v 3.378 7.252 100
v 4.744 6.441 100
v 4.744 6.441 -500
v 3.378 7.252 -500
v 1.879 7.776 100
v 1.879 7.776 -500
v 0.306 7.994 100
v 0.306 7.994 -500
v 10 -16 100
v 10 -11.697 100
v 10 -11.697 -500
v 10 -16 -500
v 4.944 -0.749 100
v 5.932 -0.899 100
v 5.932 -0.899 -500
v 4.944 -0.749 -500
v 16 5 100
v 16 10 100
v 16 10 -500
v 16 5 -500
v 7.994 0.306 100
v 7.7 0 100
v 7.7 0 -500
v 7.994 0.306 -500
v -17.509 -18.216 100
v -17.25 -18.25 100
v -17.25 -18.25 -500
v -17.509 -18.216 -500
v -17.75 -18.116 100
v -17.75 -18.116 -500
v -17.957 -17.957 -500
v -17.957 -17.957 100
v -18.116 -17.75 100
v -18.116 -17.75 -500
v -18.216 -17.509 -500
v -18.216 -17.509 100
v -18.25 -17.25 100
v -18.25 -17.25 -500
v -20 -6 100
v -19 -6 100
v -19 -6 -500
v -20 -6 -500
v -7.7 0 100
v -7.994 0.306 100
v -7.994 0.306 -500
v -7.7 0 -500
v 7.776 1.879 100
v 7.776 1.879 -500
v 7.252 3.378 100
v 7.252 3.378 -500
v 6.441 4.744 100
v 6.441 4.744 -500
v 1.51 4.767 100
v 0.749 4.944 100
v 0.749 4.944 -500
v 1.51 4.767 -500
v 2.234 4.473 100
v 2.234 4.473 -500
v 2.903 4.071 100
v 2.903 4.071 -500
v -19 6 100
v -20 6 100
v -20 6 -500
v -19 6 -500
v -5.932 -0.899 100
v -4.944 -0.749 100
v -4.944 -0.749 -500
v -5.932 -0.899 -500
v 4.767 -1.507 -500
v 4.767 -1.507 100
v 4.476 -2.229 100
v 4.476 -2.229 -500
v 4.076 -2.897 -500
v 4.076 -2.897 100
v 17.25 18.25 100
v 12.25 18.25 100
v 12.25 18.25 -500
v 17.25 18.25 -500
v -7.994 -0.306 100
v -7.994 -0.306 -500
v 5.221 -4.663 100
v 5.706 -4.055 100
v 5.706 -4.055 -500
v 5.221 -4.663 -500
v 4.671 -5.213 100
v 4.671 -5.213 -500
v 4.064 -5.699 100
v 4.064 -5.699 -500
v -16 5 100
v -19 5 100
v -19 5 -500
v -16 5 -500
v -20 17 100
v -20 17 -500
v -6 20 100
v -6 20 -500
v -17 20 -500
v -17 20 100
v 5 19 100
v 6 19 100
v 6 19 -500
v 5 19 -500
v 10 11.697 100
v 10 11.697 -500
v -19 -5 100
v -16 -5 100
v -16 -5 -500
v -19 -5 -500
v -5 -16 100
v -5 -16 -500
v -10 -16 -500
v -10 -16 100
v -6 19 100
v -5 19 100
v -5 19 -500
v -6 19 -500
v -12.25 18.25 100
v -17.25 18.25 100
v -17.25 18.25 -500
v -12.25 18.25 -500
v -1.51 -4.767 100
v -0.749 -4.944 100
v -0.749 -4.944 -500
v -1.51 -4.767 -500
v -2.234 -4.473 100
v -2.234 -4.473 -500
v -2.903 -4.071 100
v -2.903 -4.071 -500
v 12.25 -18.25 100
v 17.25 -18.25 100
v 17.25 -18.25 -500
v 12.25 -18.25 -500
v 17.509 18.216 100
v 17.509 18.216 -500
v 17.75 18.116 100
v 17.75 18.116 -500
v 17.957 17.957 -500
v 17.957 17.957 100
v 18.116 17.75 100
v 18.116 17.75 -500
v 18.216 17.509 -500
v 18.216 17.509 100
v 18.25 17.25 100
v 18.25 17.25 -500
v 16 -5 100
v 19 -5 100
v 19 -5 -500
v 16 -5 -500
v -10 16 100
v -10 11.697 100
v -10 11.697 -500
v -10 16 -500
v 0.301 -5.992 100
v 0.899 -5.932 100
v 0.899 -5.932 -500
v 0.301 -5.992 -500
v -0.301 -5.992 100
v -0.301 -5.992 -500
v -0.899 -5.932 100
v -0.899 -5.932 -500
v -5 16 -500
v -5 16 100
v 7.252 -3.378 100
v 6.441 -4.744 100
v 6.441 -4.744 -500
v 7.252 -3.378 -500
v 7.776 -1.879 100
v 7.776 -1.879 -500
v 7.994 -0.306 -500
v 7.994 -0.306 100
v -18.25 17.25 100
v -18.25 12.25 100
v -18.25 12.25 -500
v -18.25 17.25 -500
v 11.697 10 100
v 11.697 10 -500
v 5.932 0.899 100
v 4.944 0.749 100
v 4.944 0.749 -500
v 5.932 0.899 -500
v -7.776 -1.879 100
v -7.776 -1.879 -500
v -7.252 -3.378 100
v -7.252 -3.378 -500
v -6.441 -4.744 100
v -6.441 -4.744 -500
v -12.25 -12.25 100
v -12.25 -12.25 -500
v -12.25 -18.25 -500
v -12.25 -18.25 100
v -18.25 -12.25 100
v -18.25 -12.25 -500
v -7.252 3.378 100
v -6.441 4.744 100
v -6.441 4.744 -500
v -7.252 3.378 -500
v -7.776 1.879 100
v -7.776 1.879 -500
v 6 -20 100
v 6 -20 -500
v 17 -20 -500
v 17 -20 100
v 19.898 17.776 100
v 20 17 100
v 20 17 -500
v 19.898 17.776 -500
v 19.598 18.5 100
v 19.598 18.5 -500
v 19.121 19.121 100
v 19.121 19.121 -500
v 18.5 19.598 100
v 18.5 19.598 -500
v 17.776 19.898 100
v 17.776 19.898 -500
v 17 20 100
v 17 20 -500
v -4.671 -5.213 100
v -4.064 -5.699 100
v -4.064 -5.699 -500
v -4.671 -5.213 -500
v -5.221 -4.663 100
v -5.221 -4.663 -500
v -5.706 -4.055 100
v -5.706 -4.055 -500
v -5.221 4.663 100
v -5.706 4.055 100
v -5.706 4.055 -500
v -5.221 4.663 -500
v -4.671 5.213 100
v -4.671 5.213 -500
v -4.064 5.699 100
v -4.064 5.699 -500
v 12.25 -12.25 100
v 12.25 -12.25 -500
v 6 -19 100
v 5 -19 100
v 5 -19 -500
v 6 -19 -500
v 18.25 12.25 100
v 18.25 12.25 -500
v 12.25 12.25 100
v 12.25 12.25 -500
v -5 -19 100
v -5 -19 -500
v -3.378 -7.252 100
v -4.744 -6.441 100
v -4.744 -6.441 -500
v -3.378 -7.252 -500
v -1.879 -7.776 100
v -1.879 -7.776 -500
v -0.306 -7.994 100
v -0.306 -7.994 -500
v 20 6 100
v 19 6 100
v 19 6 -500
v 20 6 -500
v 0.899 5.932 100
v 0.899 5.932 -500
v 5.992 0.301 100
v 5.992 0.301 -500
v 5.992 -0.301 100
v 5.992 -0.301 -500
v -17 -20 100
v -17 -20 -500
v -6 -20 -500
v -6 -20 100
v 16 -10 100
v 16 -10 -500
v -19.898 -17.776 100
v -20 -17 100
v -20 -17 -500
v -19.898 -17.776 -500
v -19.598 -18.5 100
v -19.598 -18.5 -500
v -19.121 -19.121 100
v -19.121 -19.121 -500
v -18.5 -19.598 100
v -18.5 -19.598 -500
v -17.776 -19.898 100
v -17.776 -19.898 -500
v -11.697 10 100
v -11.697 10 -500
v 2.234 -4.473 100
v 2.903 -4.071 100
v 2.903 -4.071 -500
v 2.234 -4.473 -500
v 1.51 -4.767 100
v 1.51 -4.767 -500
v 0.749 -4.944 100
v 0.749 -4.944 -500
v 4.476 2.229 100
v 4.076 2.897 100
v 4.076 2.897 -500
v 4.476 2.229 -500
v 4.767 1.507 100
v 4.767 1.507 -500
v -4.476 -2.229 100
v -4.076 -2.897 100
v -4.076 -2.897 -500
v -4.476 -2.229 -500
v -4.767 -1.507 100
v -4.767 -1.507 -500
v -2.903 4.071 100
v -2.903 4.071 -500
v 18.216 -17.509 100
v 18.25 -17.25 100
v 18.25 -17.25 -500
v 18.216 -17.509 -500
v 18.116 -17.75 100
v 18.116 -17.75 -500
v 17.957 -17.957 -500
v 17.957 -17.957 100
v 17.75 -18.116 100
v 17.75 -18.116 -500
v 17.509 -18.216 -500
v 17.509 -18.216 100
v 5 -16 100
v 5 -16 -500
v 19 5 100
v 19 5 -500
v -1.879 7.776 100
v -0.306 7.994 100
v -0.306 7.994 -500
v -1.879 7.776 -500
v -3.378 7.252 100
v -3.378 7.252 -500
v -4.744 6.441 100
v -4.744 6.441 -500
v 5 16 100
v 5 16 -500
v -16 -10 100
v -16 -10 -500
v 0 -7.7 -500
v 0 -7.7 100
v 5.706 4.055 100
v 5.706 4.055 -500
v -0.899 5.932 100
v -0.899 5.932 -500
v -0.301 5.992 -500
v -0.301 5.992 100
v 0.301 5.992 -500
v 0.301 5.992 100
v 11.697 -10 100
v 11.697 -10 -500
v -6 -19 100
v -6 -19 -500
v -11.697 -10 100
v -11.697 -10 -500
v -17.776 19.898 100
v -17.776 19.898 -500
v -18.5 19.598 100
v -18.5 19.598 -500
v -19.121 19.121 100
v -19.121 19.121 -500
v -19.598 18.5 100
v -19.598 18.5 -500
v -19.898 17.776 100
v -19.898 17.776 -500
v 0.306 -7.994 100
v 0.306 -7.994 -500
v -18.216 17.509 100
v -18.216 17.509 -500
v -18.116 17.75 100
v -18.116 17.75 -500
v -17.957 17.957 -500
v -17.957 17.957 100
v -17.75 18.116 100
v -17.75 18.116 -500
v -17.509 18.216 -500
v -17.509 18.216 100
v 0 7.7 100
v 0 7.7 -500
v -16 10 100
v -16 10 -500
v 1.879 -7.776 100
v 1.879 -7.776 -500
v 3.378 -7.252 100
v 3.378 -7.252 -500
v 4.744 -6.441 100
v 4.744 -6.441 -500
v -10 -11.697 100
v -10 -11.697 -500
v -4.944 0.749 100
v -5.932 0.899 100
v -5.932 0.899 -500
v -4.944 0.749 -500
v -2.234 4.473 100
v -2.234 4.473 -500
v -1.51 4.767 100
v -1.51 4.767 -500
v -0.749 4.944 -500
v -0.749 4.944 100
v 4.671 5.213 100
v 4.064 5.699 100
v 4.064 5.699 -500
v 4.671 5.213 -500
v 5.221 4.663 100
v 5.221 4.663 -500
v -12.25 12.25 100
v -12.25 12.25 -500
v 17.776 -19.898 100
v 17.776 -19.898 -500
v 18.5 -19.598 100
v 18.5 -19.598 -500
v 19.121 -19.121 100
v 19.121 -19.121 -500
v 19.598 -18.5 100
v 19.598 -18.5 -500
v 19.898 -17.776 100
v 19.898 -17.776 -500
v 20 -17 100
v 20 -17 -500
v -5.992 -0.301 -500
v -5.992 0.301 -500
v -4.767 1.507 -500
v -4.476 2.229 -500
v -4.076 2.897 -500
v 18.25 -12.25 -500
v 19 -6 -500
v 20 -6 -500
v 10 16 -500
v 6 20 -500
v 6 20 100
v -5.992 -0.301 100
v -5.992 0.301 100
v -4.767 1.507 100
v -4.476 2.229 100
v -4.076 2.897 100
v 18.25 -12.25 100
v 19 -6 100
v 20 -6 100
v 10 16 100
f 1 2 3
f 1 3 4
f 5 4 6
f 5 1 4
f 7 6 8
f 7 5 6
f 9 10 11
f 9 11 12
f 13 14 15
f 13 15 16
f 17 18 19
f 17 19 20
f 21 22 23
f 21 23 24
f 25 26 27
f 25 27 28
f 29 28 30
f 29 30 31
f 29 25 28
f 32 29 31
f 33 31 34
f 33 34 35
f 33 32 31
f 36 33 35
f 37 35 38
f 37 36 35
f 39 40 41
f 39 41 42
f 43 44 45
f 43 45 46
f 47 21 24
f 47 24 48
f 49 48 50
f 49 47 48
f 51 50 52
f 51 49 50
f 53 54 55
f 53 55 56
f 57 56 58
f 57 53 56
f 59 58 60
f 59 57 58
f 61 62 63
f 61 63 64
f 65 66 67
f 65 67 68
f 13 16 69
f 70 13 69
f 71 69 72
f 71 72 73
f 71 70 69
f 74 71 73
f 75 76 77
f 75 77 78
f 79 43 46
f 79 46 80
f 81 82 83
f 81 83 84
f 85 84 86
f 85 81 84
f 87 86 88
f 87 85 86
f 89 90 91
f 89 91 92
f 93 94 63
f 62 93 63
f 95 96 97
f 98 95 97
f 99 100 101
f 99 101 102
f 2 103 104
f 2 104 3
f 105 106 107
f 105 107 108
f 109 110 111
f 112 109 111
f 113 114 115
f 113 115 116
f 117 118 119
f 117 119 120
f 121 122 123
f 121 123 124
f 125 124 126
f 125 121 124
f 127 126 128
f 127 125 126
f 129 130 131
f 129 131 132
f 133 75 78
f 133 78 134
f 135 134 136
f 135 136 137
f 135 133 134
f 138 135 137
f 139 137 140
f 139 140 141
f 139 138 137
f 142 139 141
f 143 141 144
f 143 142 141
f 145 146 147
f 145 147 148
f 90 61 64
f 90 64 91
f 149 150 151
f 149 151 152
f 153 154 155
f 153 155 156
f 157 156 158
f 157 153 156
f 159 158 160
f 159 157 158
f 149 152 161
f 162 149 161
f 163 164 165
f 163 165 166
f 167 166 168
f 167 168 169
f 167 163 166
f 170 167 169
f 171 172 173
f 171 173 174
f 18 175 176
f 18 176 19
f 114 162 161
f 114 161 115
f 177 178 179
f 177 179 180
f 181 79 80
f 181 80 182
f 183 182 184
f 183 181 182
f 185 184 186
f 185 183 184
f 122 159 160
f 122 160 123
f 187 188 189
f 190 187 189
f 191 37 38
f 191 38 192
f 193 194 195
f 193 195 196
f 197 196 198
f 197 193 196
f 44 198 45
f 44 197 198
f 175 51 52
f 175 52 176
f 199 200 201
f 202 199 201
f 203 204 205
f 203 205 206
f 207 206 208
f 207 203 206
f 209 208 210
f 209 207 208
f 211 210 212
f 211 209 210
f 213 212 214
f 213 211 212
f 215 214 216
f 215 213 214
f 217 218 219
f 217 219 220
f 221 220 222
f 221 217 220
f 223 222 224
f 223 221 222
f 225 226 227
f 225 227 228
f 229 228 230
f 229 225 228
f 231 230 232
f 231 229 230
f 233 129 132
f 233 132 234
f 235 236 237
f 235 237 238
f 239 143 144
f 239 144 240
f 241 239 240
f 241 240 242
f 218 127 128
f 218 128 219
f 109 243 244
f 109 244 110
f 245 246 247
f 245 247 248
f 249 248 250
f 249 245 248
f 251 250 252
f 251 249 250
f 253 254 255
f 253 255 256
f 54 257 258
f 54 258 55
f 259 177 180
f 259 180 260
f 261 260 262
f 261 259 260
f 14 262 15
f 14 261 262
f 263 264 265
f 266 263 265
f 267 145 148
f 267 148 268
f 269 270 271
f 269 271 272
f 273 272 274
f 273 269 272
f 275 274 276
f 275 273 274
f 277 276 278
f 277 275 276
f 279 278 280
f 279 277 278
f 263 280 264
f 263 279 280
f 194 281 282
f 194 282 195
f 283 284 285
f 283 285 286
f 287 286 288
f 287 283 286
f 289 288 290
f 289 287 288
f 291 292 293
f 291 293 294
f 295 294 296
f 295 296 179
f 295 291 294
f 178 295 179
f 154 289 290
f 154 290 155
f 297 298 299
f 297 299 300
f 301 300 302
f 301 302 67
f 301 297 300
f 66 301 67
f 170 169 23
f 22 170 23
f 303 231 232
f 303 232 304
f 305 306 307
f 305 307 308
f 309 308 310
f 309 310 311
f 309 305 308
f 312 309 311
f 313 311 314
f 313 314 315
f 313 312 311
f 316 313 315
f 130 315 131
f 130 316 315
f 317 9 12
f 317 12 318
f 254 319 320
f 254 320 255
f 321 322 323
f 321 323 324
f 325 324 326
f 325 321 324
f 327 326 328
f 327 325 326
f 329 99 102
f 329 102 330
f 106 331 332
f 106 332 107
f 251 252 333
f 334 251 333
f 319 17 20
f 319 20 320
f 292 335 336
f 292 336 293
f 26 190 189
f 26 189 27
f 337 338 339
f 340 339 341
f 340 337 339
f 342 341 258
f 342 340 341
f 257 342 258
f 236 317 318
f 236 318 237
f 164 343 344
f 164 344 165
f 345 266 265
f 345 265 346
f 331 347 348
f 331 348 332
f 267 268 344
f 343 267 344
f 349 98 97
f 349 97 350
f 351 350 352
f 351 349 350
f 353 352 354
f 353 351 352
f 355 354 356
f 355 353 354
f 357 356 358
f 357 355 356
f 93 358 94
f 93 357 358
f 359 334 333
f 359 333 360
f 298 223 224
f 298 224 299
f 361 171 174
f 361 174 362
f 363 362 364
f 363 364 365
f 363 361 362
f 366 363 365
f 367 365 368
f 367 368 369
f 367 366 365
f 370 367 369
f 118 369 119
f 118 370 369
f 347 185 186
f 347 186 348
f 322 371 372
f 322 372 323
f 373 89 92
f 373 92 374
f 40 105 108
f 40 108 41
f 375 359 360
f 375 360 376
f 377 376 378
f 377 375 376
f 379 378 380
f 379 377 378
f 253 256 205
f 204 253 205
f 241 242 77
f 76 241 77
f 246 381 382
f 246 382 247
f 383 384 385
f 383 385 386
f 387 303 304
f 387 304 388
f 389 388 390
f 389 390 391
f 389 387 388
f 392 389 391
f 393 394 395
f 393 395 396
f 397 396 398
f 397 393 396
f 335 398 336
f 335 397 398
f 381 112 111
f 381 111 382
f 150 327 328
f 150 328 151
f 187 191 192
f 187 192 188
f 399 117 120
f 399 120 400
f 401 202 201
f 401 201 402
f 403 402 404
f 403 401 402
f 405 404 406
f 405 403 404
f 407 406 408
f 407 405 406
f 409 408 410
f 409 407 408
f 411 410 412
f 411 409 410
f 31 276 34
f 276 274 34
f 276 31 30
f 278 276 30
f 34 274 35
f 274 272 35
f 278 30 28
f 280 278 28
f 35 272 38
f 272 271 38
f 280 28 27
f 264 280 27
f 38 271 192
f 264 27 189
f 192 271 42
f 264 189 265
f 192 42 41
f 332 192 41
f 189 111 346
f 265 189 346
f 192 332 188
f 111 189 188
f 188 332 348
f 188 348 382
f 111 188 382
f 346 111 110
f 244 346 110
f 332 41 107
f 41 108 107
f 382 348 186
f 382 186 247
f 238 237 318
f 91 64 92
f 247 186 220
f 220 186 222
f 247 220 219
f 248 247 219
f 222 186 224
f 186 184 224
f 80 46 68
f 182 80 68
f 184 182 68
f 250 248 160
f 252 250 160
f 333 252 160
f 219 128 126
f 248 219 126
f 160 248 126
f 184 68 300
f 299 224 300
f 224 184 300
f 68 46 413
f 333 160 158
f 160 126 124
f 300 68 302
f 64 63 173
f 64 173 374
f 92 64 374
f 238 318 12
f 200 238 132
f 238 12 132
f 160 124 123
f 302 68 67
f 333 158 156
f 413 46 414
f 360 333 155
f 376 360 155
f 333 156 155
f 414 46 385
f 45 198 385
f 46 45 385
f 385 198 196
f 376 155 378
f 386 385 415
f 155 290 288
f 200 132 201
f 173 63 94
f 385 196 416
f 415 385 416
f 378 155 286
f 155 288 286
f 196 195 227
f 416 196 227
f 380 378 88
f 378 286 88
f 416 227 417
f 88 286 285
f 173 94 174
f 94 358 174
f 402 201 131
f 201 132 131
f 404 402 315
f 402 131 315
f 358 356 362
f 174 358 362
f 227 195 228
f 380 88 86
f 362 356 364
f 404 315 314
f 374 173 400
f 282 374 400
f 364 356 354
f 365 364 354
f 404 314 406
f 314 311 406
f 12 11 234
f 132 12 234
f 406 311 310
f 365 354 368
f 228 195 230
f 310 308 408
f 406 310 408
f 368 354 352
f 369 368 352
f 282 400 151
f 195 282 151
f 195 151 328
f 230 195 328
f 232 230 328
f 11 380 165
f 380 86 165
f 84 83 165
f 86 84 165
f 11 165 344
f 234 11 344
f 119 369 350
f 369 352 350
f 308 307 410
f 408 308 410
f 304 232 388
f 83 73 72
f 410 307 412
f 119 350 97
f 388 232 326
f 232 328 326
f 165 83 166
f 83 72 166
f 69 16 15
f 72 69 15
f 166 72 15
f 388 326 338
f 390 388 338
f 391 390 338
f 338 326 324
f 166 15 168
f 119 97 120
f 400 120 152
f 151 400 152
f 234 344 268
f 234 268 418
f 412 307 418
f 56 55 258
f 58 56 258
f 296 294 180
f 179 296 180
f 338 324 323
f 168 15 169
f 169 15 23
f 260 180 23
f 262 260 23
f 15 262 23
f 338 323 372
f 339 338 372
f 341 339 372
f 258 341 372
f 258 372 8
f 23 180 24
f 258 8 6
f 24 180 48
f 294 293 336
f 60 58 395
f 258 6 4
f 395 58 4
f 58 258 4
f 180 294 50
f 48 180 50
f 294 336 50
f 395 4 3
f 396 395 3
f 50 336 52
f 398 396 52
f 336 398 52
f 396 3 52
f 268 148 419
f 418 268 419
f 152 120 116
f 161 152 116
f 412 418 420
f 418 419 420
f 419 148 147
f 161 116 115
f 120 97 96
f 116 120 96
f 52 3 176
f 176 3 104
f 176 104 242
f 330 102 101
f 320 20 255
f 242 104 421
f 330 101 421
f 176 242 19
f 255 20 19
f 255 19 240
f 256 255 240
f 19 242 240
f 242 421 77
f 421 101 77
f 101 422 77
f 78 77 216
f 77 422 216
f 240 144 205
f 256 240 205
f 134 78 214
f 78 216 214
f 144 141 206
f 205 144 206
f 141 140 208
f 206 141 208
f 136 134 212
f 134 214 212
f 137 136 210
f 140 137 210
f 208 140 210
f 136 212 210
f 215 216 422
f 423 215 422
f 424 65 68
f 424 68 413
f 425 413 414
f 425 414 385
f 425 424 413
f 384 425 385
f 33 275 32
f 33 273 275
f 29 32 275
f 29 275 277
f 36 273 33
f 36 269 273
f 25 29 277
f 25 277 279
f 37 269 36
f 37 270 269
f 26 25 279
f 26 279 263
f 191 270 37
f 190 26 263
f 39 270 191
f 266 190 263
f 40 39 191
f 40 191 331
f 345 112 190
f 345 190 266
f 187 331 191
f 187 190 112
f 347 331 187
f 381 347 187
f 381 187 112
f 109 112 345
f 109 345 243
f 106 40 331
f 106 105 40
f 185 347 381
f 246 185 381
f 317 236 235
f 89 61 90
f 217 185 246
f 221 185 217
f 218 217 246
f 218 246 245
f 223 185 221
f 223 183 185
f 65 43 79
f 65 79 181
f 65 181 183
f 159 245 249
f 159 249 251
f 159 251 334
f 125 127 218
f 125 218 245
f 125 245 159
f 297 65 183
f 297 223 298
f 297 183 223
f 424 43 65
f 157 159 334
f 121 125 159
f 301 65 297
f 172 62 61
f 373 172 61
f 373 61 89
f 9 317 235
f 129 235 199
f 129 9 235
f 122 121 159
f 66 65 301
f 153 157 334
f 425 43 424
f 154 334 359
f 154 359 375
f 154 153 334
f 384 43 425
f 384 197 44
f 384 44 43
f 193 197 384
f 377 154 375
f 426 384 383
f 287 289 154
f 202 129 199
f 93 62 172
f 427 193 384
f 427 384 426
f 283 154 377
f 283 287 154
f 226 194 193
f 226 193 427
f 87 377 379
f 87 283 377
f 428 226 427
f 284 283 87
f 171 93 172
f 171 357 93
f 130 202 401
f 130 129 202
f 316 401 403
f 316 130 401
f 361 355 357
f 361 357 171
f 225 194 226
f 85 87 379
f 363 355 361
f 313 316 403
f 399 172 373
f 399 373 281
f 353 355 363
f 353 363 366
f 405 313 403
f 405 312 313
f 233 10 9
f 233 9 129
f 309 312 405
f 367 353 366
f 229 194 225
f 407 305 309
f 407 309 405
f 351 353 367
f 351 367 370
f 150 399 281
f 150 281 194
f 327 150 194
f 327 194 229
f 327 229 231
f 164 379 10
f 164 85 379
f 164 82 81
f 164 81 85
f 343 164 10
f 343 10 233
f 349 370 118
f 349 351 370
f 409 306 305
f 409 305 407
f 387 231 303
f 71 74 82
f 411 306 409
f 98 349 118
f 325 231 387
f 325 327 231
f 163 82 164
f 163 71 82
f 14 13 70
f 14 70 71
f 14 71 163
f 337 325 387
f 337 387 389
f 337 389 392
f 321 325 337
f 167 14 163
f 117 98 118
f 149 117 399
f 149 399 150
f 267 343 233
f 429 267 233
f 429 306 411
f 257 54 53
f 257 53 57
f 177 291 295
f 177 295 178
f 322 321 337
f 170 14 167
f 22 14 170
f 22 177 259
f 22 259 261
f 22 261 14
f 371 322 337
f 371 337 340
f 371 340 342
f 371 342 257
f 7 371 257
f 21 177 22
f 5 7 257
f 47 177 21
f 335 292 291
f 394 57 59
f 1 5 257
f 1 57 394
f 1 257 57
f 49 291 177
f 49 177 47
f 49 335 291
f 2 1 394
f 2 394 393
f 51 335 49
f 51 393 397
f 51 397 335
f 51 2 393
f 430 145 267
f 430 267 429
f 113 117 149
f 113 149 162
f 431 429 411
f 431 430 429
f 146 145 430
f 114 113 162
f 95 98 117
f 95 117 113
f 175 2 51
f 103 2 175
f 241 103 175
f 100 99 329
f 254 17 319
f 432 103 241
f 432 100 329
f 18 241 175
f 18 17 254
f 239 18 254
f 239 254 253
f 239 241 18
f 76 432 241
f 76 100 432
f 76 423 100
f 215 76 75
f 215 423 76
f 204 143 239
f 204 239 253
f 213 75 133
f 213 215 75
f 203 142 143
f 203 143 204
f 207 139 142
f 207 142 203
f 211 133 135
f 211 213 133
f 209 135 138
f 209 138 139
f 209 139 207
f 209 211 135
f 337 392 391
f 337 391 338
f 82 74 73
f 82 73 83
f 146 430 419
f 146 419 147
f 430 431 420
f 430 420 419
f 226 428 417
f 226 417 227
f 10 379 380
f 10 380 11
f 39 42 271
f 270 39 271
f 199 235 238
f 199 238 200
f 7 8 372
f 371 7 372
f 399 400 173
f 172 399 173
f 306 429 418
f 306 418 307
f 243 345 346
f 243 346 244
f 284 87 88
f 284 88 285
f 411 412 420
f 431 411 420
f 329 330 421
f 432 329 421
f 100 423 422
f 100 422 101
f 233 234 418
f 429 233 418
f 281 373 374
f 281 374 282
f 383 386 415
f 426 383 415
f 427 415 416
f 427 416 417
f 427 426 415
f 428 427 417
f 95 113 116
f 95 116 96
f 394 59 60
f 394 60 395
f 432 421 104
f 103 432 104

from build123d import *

# Parameters (mm, degrees)
BOSS_EXTRU_1_DEPTH = 600


with BuildPart() as part:
    # Esquisse1 → Boss.-Extru.1 (new body)
    with BuildSketch(Plane.XY.offset(100)):
        with BuildLine():
            Line((6, -19), (6, -20))
            Line((6, -20), (17, -20))
            ThreePointArc((17, -20), (19.121320344, -19.121320344), (20, -17))
            Line((20, -17), (20, -6))
            Line((20, -6), (19, -6))
            Line((19, -6), (19, -5))
            Line((19, -5), (16, -5))
            Line((16, -5), (16, -10))
            Line((16, -10), (11.697056276, -10))
            Line((11.697056276, -10), (6.44138072, -4.744324444))
            ThreePointArc((6.44138072, -4.744324444), (7.551143817, -2.642011933), (7.994130058, -0.306405969))
            Line((7.994130058, -0.306405969), (7.7, 0))
            Line((7.7, 0), (7.994130058, 0.306405971))
            ThreePointArc((7.994130058, 0.306405971), (7.551143817, 2.642011934), (6.441380719, 4.744324444))
            Line((6.441380719, 4.744324444), (11.697056275, 10))
            Line((11.697056275, 10), (16, 10))
            Line((16, 10), (16, 5))
            Line((16, 5), (19, 5))
            Line((19, 5), (19, 6))
            Line((19, 6), (20, 6))
            Line((20, 6), (20, 17))
            ThreePointArc((20, 17), (19.121320344, 19.121320344), (17, 20))
            Line((17, 20), (6, 20))
            Line((6, 20), (6, 19))
            Line((6, 19), (5, 19))
            Line((5, 19), (5, 15.999999999))
            Line((5, 15.999999999), (10.000000001, 15.999999999))
            Line((10.000000001, 15.999999999), (10.000000001, 11.697056275))
            Line((10.000000001, 11.697056275), (4.744324444, 6.441380719))
            ThreePointArc((4.744324444, 6.441380719), (2.642011933, 7.551143817), (0.306405969, 7.994130058))
            Line((0.306405969, 7.994130058), (0, 7.7))
            Line((0, 7.7), (-0.30640597, 7.994130058))
            ThreePointArc((-0.30640597, 7.994130058), (-2.642011933, 7.551143817), (-4.744324444, 6.441380719))
            Line((-4.744324444, 6.441380719), (-9.999999999, 11.697056274))
            Line((-9.999999999, 11.697056274), (-9.999999999, 15.999999999))
            Line((-9.999999999, 15.999999999), (-5, 15.999999999))
            Line((-5, 15.999999999), (-5, 19))
            Line((-5, 19), (-6, 19))
            Line((-6, 19), (-6, 20))
            Line((-6, 20), (-17, 20))
            ThreePointArc((-17, 20), (-19.121320344, 19.121320344), (-20, 17))
            Line((-20, 17), (-20, 6))
            Line((-20, 6), (-19, 6))
            Line((-19, 6), (-19, 5))
            Line((-19, 5), (-16, 5))
            Line((-16, 5), (-16, 10))
            Line((-16, 10), (-11.697056274, 10))
            Line((-11.697056274, 10), (-6.441380718, 4.744324445))
            ThreePointArc((-6.441380718, 4.744324445), (-7.551143817, 2.642011933), (-7.994130058, 0.306405969))
            Line((-7.994130058, 0.306405969), (-7.699999999, 0))
            Line((-7.699999999, 0), (-7.994130057, -0.306405971))
            ThreePointArc((-7.994130057, -0.306405971), (-7.551143816, -2.642011934), (-6.441380719, -4.744324444))
            Line((-6.441380719, -4.744324444), (-11.697056275, -10))
            Line((-11.697056275, -10), (-16, -10))
            Line((-16, -10), (-16, -5))
            Line((-16, -5), (-19, -5))
            Line((-19, -5), (-19, -6))
            Line((-19, -6), (-20, -6))
            Line((-20, -6), (-20, -17))
            ThreePointArc((-20, -17), (-19.121320344, -19.121320344), (-17, -20))
            Line((-17, -20), (-6, -20))
            Line((-6, -20), (-6, -19))
            Line((-6, -19), (-5, -19))
            Line((-5, -19), (-5, -16.000000001))
            Line((-5, -16.000000001), (-9.999999999, -16.000000001))
            Line((-9.999999999, -16.000000001), (-9.999999999, -11.697056274))
            Line((-9.999999999, -11.697056274), (-4.744324444, -6.441380719))
            ThreePointArc((-4.744324444, -6.441380719), (-2.642011933, -7.551143817), (-0.306405969, -7.994130058))
            Line((-0.306405969, -7.994130058), (0, -7.7))
            Line((0, -7.7), (0.306405971, -7.994130058))
            ThreePointArc((0.306405971, -7.994130058), (2.642011934, -7.551143817), (4.744324445, -6.441380719))
            Line((4.744324445, -6.441380719), (10.000000001, -11.697056274))
            Line((10.000000001, -11.697056274), (10.000000001, -16.000000001))
            Line((10.000000001, -16.000000001), (5, -16.000000001))
            Line((5, -16.000000001), (5, -19))
            Line((5, -19), (6, -19))
        make_face()
        with BuildLine():
            Line((18.25, 12.25), (12.25, 12.25))
            Line((12.25, 12.25), (12.25, 18.25))
            Line((12.25, 18.25), (17.25, 18.25))
            ThreePointArc((17.25, 18.25), (17.957106781, 17.957106781), (18.25, 17.25))
            Line((18.25, 17.25), (18.25, 12.25))
        make_face(mode=Mode.SUBTRACT)
        with BuildLine():
            Line((-18.25, -12.25), (-12.25, -12.25))
            Line((-12.25, -12.25), (-12.25, -18.25))
            Line((-12.25, -18.25), (-17.25, -18.25))
            ThreePointArc((-17.25, -18.25), (-17.957106781, -17.957106781), (-18.25, -17.25))
            Line((-18.25, -17.25), (-18.25, -12.25))
        make_face(mode=Mode.SUBTRACT)
        with BuildLine():
            Line((-12.25, 18.25), (-12.25, 12.25))
            Line((-12.25, 12.25), (-18.25, 12.25))
            Line((-18.25, 12.25), (-18.25, 17.25))
            ThreePointArc((-18.25, 17.25), (-17.957106781, 17.957106781), (-17.25, 18.25))
            Line((-17.25, 18.25), (-12.25, 18.25))
        make_face(mode=Mode.SUBTRACT)
        with BuildLine():
            Line((12.25, -18.25), (12.25, -12.25))
            Line((12.25, -12.25), (18.25, -12.25))
            Line((18.25, -12.25), (18.25, -17.25))
            ThreePointArc((18.25, -17.25), (17.957106781, -17.957106781), (17.25, -18.25))
            Line((17.25, -18.25), (12.25, -18.25))
        make_face(mode=Mode.SUBTRACT)
        with BuildLine():
            Line((-5.705709703, -4.055228326), (-4.075506937, -2.896591666))
            ThreePointArc((-4.075506937, -2.896591666), (-4.635549589, -1.873947727), (-4.943520622, -0.749402378))
            Line((-4.943520622, -0.749402378), (-5.932224738, -0.899282852))
            ThreePointArc((-5.932224738, -0.899282852), (-6, 0), (-5.932224738, 0.899282853))
            Line((-5.932224738, 0.899282853), (-4.943520622, 0.749402379))
            ThreePointArc((-4.943520622, 0.749402379), (-4.635549588, 1.873947727), (-4.075506937, 2.896591666))
            Line((-4.075506937, 2.896591666), (-5.705709704, 4.055228326))
            ThreePointArc((-5.705709704, 4.055228326), (-4.953610357, 4.945881563), (-4.064132573, 5.699370705))
            Line((-4.064132573, 5.699370705), (-2.902951842, 4.070979081))
            ThreePointArc((-2.902951842, 4.070979081), (-1.877566249, 4.634085136), (-0.749402377, 4.943520623))
            Line((-0.749402377, 4.943520623), (-0.899282852, 5.932224739))
            ThreePointArc((-0.899282852, 5.932224739), (0, 6), (0.899282852, 5.932224739))
            Line((0.899282852, 5.932224739), (0.749402377, 4.943520623))
            ThreePointArc((0.749402377, 4.943520623), (1.87756625, 4.634085136), (2.902951843, 4.07097908))
            Line((2.902951843, 4.07097908), (4.064132575, 5.699370704))
            ThreePointArc((4.064132575, 5.699370704), (4.953610358, 4.945881562), (5.705709704, 4.055228326))
            Line((5.705709704, 4.055228326), (4.075506937, 2.896591666))
            ThreePointArc((4.075506937, 2.896591666), (4.635549589, 1.873947727), (4.943520623, 0.749402378))
            Line((4.943520623, 0.749402378), (5.932224739, 0.899282853))
            ThreePointArc((5.932224739, 0.899282853), (6, 0), (5.932224739, -0.899282853))
            Line((5.932224739, -0.899282853), (4.943520623, -0.749402379))
            ThreePointArc((4.943520623, -0.749402379), (4.635549589, -1.873947727), (4.075506938, -2.896591666))
            Line((4.075506938, -2.896591666), (5.705709704, -4.055228326))
            ThreePointArc((5.705709704, -4.055228326), (4.953610357, -4.945881563), (4.064132573, -5.699370705))
            Line((4.064132573, -5.699370705), (2.902951842, -4.070979081))
            ThreePointArc((2.902951842, -4.070979081), (1.87756625, -4.634085136), (0.749402378, -4.943520623))
            Line((0.749402378, -4.943520623), (0.899282852, -5.932224739))
            ThreePointArc((0.899282852, -5.932224739), (1e-09, -6), (-0.899282851, -5.932224739))
            Line((-0.899282851, -5.932224739), (-0.749402377, -4.943520623))
            ThreePointArc((-0.749402377, -4.943520623), (-1.87756625, -4.634085136), (-2.902951843, -4.07097908))
            Line((-2.902951843, -4.07097908), (-4.064132574, -5.699370704))
            ThreePointArc((-4.064132574, -5.699370704), (-4.953610357, -4.945881562), (-5.705709703, -4.055228326))
        make_face(mode=Mode.SUBTRACT)
    extrude(amount=-BOSS_EXTRU_1_DEPTH)


solid = part.part
